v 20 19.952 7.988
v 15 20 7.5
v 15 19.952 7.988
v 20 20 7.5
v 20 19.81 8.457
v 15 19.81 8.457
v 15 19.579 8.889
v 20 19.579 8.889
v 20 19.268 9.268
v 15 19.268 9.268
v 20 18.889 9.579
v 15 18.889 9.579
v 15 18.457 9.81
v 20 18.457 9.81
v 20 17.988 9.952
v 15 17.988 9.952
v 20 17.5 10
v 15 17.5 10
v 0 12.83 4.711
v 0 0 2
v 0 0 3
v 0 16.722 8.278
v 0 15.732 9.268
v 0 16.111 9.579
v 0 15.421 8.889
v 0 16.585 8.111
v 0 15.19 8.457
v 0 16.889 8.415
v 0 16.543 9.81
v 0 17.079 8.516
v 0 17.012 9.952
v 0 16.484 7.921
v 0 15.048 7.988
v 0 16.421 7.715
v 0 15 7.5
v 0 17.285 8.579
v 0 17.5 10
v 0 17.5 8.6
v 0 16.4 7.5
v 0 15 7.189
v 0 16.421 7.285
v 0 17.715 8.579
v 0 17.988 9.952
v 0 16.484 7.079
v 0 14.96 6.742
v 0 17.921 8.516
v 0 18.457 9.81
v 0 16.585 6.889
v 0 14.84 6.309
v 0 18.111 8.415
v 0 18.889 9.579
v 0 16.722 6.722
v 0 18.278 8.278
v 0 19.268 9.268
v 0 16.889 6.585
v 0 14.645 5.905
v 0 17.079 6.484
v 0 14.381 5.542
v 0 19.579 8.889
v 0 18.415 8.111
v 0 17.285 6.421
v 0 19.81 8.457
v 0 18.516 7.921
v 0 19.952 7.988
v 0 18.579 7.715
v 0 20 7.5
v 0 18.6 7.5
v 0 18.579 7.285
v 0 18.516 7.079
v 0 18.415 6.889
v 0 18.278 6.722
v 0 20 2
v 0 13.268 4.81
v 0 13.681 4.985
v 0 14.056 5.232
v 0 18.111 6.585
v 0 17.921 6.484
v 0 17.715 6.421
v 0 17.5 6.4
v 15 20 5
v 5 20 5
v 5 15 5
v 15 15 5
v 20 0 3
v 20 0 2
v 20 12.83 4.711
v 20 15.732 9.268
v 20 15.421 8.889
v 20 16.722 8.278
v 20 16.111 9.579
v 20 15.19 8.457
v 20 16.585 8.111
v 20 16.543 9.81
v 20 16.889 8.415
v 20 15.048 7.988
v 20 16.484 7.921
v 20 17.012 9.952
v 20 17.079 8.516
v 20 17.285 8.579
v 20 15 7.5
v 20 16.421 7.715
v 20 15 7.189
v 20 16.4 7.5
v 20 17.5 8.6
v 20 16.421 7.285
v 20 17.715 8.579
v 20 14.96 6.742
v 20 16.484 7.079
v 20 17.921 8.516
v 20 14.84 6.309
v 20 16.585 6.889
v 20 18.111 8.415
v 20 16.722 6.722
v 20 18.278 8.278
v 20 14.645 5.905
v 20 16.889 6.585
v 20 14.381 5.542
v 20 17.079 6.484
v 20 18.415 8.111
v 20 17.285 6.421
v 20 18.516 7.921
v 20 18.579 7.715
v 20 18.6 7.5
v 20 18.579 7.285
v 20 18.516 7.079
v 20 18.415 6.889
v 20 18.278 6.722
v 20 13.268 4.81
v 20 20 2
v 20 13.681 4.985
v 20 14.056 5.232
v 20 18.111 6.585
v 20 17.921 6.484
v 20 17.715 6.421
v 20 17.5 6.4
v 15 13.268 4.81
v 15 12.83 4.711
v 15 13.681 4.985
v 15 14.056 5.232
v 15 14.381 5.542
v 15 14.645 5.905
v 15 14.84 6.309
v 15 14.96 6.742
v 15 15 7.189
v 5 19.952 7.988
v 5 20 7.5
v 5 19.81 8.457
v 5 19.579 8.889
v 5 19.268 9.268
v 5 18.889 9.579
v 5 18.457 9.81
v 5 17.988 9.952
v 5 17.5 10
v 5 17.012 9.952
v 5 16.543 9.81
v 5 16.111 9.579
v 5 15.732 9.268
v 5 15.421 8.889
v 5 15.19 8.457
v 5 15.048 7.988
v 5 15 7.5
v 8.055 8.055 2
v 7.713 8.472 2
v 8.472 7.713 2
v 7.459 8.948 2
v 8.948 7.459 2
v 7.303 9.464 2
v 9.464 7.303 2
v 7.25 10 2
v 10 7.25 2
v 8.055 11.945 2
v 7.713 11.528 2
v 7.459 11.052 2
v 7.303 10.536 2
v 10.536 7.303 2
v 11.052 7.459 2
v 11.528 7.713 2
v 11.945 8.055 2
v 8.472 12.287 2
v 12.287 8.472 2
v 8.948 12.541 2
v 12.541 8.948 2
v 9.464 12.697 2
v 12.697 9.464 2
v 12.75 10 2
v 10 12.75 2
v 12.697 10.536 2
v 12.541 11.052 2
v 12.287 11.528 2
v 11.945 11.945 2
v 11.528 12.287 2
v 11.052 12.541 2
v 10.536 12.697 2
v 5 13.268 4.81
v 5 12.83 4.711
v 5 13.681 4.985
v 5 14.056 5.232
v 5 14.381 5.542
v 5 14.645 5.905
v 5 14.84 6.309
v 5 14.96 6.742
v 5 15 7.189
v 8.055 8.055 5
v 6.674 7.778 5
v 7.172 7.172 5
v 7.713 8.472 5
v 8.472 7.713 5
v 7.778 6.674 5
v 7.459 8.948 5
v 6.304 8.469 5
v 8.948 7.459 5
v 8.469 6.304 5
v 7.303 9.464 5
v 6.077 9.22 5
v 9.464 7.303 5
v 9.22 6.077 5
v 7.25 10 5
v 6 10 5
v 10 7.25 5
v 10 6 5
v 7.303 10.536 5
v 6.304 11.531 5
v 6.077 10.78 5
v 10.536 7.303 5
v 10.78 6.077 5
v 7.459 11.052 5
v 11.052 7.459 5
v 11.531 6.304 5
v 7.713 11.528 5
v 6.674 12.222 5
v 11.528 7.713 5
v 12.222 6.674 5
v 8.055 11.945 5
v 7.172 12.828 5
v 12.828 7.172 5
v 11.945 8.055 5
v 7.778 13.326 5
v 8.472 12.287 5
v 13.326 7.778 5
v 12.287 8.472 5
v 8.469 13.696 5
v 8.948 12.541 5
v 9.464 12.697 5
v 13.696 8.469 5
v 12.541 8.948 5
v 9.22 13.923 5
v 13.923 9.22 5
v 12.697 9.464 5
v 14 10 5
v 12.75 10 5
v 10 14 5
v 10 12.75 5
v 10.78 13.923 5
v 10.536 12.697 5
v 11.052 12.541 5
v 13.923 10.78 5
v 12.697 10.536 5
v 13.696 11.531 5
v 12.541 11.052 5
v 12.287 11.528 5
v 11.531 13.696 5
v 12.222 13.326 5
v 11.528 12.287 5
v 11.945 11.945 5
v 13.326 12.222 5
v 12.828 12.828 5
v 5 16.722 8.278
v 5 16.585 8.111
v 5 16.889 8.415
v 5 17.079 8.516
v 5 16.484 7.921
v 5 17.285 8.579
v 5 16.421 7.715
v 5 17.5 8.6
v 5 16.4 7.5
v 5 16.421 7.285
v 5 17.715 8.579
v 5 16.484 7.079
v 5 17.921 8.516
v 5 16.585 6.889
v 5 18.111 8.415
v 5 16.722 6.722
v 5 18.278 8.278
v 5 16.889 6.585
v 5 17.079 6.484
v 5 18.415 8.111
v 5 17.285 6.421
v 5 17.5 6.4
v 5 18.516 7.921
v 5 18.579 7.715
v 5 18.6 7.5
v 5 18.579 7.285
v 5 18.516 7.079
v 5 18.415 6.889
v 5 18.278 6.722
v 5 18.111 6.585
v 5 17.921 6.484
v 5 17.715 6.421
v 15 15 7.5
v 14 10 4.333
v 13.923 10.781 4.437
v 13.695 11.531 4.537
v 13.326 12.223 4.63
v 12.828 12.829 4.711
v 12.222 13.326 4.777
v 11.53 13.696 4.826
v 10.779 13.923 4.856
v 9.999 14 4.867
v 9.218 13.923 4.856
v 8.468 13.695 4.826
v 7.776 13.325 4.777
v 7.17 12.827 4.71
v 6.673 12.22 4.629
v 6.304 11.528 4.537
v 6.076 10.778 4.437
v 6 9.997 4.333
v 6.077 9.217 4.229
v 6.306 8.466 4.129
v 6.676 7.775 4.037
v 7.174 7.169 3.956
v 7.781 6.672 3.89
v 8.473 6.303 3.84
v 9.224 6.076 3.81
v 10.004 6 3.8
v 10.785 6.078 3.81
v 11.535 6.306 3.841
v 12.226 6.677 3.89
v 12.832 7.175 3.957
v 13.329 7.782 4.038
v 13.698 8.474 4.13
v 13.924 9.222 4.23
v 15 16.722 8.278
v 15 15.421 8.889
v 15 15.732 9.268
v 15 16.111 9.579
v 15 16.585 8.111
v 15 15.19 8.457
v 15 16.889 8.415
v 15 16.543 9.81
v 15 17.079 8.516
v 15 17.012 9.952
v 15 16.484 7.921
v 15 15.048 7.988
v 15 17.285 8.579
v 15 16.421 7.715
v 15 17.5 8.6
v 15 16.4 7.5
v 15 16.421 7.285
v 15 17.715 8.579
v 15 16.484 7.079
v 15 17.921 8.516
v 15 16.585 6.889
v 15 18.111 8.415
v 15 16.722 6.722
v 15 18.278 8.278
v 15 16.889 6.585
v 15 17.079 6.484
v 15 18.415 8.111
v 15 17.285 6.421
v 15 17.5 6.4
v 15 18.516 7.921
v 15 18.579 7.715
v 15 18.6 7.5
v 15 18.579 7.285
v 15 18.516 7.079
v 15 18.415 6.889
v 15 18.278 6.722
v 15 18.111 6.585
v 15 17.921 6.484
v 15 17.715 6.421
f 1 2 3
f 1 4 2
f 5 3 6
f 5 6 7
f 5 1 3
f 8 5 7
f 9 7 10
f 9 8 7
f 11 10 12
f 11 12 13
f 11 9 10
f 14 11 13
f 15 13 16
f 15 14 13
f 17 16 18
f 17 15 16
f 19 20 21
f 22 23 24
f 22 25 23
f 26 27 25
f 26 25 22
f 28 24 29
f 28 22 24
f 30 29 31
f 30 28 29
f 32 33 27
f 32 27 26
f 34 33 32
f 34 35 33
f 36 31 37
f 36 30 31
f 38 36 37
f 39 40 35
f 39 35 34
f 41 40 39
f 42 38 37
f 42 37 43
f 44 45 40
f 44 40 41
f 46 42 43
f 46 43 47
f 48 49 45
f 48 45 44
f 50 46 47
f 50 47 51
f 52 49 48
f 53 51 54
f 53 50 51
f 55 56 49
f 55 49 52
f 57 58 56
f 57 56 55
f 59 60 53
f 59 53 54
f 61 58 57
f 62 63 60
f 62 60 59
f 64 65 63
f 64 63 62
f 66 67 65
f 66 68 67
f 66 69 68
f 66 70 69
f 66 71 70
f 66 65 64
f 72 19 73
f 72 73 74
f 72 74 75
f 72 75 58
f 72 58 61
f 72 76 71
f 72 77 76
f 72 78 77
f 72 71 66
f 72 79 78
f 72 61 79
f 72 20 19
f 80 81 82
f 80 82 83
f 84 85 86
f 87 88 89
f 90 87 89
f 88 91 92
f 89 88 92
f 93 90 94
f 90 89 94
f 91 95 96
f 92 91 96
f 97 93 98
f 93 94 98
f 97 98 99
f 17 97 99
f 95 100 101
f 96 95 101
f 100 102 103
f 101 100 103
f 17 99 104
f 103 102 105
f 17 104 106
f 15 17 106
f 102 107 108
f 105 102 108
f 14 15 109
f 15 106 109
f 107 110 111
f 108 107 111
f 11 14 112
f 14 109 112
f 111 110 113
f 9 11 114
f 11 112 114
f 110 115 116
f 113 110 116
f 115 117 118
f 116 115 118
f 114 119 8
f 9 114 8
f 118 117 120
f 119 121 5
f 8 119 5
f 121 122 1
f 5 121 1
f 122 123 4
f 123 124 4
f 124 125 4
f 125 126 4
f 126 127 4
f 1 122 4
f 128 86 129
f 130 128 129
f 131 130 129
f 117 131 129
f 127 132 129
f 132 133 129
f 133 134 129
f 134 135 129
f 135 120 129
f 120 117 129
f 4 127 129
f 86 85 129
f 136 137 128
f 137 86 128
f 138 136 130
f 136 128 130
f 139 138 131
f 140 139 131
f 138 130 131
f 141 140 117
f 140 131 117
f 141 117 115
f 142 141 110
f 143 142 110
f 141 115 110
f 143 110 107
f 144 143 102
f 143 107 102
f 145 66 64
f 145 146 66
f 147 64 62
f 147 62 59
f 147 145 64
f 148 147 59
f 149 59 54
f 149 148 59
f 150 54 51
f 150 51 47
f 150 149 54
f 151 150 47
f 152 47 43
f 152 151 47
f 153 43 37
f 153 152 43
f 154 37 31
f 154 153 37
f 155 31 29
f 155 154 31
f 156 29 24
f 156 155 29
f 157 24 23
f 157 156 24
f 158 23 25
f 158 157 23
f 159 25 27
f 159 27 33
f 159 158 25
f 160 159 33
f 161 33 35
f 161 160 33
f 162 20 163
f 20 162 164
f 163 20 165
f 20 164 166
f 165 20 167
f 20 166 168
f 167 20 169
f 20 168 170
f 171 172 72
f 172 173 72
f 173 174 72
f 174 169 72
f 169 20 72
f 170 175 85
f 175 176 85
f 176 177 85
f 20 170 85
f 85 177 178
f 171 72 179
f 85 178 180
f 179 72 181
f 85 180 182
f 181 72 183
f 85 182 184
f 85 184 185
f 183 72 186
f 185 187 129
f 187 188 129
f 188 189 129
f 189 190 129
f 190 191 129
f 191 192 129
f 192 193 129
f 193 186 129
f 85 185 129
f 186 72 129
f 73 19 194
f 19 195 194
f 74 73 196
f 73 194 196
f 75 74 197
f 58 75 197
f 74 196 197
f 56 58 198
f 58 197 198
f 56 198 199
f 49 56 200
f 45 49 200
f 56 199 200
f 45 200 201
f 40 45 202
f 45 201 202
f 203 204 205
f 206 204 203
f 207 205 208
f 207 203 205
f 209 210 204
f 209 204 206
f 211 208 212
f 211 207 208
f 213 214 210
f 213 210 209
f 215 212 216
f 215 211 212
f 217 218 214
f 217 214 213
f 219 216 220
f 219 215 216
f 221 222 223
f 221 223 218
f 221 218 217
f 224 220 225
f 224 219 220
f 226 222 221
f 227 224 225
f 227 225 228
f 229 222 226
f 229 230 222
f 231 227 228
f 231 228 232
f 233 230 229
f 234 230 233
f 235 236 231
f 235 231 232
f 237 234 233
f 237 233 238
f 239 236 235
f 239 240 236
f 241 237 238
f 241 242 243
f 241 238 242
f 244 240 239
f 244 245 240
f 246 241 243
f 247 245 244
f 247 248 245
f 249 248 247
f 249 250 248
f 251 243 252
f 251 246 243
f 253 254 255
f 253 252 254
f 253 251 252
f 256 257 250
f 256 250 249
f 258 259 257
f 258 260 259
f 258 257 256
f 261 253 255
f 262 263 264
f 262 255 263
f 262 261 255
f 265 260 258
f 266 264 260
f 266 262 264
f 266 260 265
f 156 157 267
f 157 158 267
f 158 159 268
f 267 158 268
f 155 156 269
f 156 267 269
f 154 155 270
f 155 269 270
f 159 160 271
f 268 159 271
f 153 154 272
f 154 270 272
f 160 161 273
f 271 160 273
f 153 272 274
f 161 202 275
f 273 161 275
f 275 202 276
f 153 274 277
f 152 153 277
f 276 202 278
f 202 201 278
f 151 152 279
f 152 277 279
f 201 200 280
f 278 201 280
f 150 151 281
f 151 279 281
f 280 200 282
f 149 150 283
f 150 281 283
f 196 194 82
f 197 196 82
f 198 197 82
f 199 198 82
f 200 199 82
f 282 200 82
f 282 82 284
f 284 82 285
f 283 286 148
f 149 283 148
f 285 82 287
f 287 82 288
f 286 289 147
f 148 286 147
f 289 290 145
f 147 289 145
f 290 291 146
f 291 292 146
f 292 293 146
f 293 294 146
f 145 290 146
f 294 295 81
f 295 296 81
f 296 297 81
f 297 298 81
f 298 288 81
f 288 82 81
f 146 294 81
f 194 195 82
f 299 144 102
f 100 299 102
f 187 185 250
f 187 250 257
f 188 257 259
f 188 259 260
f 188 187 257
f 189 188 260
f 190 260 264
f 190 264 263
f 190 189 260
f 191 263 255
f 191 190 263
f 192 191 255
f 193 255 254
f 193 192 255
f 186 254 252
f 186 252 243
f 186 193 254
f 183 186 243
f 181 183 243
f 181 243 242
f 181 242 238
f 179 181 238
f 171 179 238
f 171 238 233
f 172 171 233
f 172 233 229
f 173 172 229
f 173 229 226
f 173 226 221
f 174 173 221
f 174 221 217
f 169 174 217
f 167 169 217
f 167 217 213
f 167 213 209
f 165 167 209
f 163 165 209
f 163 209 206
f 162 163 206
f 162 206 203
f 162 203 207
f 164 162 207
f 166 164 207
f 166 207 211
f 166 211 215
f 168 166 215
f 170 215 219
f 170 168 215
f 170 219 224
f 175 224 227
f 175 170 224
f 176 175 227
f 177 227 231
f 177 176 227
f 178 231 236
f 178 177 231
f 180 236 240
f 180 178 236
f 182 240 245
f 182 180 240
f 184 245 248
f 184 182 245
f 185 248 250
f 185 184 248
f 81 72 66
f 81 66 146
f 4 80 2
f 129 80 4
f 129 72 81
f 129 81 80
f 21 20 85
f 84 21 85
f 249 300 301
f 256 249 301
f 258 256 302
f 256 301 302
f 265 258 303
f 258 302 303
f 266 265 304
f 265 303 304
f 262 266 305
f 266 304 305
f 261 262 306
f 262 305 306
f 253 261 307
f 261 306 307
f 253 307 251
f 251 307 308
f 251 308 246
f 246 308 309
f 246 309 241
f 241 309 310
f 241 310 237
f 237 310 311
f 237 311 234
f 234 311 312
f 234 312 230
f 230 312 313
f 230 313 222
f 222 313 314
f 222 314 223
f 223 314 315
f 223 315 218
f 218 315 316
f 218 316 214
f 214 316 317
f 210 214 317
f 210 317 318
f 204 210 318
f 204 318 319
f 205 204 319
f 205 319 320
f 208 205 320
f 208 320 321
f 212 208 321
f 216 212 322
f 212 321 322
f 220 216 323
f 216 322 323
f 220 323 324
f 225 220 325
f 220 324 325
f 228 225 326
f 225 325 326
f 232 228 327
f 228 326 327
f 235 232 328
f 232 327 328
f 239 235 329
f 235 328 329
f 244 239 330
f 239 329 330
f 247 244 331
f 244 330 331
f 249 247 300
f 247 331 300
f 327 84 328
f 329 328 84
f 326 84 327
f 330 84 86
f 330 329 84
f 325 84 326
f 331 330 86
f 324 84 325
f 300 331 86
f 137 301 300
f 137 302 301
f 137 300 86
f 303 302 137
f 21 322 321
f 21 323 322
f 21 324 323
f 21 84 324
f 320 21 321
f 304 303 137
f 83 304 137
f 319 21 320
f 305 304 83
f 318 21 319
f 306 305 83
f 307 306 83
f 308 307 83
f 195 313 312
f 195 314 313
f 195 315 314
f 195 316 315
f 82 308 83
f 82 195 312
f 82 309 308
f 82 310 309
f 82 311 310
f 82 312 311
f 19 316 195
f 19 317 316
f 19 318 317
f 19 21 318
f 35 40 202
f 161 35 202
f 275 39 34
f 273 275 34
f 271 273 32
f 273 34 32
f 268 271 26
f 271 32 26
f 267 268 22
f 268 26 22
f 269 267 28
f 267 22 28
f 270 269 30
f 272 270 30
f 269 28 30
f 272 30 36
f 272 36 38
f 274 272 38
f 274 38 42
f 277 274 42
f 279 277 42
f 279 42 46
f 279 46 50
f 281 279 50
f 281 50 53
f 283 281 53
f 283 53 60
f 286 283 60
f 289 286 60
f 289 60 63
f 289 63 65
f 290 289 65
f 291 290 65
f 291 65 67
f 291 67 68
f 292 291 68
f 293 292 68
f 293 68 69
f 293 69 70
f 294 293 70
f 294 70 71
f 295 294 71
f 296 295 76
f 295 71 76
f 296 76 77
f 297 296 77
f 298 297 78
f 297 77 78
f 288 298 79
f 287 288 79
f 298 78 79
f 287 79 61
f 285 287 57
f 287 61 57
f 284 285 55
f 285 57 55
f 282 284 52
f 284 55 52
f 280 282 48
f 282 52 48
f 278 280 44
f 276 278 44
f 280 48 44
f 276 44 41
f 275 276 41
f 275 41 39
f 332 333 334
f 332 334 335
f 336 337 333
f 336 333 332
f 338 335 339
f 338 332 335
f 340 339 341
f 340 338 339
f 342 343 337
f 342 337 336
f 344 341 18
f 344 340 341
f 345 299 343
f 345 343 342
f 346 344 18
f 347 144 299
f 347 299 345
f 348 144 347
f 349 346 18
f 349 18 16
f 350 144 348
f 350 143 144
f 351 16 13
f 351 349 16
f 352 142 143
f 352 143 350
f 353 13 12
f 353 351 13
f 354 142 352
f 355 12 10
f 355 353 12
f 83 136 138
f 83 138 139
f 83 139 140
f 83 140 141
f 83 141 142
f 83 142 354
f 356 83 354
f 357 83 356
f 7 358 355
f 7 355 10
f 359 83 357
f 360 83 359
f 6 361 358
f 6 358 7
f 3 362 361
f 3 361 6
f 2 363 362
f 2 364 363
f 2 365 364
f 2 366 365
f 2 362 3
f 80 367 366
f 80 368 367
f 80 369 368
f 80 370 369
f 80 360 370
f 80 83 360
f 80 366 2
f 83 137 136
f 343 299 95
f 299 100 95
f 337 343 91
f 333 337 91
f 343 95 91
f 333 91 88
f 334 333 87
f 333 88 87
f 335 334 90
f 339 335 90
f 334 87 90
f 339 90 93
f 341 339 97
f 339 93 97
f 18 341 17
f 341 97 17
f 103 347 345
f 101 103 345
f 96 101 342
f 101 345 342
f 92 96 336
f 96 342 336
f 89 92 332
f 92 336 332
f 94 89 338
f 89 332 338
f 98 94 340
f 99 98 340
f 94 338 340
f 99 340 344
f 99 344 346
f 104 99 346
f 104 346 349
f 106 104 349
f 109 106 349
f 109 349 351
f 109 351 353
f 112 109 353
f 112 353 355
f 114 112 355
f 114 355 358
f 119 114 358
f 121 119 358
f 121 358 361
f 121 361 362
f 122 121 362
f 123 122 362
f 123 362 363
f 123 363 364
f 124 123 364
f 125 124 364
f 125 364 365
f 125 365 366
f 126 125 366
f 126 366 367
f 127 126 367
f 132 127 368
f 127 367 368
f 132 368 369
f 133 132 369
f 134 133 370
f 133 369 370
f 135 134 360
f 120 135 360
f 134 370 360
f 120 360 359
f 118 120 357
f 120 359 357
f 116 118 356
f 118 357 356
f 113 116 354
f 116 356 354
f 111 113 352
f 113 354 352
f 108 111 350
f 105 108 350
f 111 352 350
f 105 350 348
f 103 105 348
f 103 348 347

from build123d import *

# Parameters (mm, degrees)
F0_W        = 20
F0_H        = 20
F0_R        = 4
F1_DEPTH    = 4
F1_FACE_W   = 20
F1_FACE_H   = 20
F1_FACE_R   = 4
F0_R_2      = 2.75
F2_DEPTH    = 1
F3_W        = 5
F3_H        = 5
F4_DEPTH    = 5
F5_T1_DEPTH = 97.9746917615
F6_R        = 2.49999
F7_R        = 1.1
F8_DEPTH    = 25
F9_DEPTH    = 5
F10_DEPTH   = 2
F11_DEPTH   = 2


# Not quite as in the source:
# - a fillet or chamfer that OpenCascade refuses, or shapes differently, is made with other operations: its cross-section is extruded or revolved along the edge and cut away or added
# - a fillet or chamfer is up to 0.001 mm smaller than in the source, because OpenCascade refuses the exact size


with BuildPart() as f1:
    # F0 (on Top) → F1 (new body)
    with BuildSketch(Plane.XY):
        with Locations((10, 10)):
            Rectangle(F0_W, F0_H)
        with Locations((10, 10)):
            Circle(F0_R, mode=Mode.SUBTRACT)
    extrude(amount=F1_DEPTH)

    # F1_face (on face) + F0 (on Top) → F2 (join)
    with BuildSketch(Plane(origin=(10, 10, 4), x_dir=(1, 0, 0), z_dir=(0, 0, 1))):
        Rectangle(F1_FACE_W, F1_FACE_H)
        Circle(F1_FACE_R, mode=Mode.SUBTRACT)
    with BuildSketch(Plane.XY):
        with Locations((10, 10)):
            Circle(F0_R)
        with Locations((10, 10)):
            Circle(F0_R_2, mode=Mode.SUBTRACT)
    extrude(amount=F2_DEPTH)

    # F3 (on face) → F4 (join)
    with BuildSketch(Plane.XY.offset(5)):
        with Locations((2.5, 17.5)):
            Rectangle(F3_W, F3_H)
        with Locations((17.5, 17.5)):
            Rectangle(F3_W, F3_H)
    extrude(amount=F4_DEPTH)

    # F5: chamfer of 15 x 2 on 1 edges, made by hand

    # F5_s2 → F5_t1 (cut)
    with BuildSketch(Plane.YZ.offset(-38.9873458808)):
        Polygon((0, 3), (15, 5), (0, 5), align=None)
    extrude(amount=F5_T1_DEPTH, mode=Mode.SUBTRACT)

    # F6 (radius 2.5 in the source; OpenCascade refuses exactly that, so slightly less here)
    f6_edges = [f1.edges().sort_by_distance(p)[0] for p in [
        (2.5, 15, 5),
        (2.5, 15, 10),
        (17.5, 15, 5),
        (17.5, 15, 10),
        (2.5, 20, 10),
        (17.5, 20, 10),
    ]]
    fillet(f6_edges, radius=F6_R)

    # F7 (on face) → F8 (cut)
    with BuildSketch(Plane(origin=(0, 0, 0), x_dir=(0, -1, 0), z_dir=(-1, 0, 0))):
        with Locations((-17.5, 7.5)):
            Circle(F7_R)
    extrude(amount=-F8_DEPTH, mode=Mode.SUBTRACT)

    # F0 (on Top) → F9 (join)
    with BuildSketch(Plane.XY):
        with Locations((10, 10)):
            Circle(F0_R)
        with Locations((10, 10)):
            Circle(F0_R_2, mode=Mode.SUBTRACT)
    extrude(amount=F9_DEPTH)

    # F0 (on Top) → F10 (join)
    with BuildSketch(Plane.XY):
        with Locations((10, 10)):
            Circle(F0_R_2)
    extrude(amount=F10_DEPTH)

    # F0 (on Top) → F11 (cut)
    with BuildSketch(Plane.XY):
        with Locations((10, 10)):
            Rectangle(F0_W, F0_H)
        with Locations((10, 10)):
            Circle(F0_R, mode=Mode.SUBTRACT)
        with Locations((10, 10)):
            Circle(F0_R)
        with Locations((10, 10)):
            Circle(F0_R_2, mode=Mode.SUBTRACT)
        with Locations((10, 10)):
            Circle(F0_R_2)
    extrude(amount=F11_DEPTH, mode=Mode.SUBTRACT)


solid = f1.part
